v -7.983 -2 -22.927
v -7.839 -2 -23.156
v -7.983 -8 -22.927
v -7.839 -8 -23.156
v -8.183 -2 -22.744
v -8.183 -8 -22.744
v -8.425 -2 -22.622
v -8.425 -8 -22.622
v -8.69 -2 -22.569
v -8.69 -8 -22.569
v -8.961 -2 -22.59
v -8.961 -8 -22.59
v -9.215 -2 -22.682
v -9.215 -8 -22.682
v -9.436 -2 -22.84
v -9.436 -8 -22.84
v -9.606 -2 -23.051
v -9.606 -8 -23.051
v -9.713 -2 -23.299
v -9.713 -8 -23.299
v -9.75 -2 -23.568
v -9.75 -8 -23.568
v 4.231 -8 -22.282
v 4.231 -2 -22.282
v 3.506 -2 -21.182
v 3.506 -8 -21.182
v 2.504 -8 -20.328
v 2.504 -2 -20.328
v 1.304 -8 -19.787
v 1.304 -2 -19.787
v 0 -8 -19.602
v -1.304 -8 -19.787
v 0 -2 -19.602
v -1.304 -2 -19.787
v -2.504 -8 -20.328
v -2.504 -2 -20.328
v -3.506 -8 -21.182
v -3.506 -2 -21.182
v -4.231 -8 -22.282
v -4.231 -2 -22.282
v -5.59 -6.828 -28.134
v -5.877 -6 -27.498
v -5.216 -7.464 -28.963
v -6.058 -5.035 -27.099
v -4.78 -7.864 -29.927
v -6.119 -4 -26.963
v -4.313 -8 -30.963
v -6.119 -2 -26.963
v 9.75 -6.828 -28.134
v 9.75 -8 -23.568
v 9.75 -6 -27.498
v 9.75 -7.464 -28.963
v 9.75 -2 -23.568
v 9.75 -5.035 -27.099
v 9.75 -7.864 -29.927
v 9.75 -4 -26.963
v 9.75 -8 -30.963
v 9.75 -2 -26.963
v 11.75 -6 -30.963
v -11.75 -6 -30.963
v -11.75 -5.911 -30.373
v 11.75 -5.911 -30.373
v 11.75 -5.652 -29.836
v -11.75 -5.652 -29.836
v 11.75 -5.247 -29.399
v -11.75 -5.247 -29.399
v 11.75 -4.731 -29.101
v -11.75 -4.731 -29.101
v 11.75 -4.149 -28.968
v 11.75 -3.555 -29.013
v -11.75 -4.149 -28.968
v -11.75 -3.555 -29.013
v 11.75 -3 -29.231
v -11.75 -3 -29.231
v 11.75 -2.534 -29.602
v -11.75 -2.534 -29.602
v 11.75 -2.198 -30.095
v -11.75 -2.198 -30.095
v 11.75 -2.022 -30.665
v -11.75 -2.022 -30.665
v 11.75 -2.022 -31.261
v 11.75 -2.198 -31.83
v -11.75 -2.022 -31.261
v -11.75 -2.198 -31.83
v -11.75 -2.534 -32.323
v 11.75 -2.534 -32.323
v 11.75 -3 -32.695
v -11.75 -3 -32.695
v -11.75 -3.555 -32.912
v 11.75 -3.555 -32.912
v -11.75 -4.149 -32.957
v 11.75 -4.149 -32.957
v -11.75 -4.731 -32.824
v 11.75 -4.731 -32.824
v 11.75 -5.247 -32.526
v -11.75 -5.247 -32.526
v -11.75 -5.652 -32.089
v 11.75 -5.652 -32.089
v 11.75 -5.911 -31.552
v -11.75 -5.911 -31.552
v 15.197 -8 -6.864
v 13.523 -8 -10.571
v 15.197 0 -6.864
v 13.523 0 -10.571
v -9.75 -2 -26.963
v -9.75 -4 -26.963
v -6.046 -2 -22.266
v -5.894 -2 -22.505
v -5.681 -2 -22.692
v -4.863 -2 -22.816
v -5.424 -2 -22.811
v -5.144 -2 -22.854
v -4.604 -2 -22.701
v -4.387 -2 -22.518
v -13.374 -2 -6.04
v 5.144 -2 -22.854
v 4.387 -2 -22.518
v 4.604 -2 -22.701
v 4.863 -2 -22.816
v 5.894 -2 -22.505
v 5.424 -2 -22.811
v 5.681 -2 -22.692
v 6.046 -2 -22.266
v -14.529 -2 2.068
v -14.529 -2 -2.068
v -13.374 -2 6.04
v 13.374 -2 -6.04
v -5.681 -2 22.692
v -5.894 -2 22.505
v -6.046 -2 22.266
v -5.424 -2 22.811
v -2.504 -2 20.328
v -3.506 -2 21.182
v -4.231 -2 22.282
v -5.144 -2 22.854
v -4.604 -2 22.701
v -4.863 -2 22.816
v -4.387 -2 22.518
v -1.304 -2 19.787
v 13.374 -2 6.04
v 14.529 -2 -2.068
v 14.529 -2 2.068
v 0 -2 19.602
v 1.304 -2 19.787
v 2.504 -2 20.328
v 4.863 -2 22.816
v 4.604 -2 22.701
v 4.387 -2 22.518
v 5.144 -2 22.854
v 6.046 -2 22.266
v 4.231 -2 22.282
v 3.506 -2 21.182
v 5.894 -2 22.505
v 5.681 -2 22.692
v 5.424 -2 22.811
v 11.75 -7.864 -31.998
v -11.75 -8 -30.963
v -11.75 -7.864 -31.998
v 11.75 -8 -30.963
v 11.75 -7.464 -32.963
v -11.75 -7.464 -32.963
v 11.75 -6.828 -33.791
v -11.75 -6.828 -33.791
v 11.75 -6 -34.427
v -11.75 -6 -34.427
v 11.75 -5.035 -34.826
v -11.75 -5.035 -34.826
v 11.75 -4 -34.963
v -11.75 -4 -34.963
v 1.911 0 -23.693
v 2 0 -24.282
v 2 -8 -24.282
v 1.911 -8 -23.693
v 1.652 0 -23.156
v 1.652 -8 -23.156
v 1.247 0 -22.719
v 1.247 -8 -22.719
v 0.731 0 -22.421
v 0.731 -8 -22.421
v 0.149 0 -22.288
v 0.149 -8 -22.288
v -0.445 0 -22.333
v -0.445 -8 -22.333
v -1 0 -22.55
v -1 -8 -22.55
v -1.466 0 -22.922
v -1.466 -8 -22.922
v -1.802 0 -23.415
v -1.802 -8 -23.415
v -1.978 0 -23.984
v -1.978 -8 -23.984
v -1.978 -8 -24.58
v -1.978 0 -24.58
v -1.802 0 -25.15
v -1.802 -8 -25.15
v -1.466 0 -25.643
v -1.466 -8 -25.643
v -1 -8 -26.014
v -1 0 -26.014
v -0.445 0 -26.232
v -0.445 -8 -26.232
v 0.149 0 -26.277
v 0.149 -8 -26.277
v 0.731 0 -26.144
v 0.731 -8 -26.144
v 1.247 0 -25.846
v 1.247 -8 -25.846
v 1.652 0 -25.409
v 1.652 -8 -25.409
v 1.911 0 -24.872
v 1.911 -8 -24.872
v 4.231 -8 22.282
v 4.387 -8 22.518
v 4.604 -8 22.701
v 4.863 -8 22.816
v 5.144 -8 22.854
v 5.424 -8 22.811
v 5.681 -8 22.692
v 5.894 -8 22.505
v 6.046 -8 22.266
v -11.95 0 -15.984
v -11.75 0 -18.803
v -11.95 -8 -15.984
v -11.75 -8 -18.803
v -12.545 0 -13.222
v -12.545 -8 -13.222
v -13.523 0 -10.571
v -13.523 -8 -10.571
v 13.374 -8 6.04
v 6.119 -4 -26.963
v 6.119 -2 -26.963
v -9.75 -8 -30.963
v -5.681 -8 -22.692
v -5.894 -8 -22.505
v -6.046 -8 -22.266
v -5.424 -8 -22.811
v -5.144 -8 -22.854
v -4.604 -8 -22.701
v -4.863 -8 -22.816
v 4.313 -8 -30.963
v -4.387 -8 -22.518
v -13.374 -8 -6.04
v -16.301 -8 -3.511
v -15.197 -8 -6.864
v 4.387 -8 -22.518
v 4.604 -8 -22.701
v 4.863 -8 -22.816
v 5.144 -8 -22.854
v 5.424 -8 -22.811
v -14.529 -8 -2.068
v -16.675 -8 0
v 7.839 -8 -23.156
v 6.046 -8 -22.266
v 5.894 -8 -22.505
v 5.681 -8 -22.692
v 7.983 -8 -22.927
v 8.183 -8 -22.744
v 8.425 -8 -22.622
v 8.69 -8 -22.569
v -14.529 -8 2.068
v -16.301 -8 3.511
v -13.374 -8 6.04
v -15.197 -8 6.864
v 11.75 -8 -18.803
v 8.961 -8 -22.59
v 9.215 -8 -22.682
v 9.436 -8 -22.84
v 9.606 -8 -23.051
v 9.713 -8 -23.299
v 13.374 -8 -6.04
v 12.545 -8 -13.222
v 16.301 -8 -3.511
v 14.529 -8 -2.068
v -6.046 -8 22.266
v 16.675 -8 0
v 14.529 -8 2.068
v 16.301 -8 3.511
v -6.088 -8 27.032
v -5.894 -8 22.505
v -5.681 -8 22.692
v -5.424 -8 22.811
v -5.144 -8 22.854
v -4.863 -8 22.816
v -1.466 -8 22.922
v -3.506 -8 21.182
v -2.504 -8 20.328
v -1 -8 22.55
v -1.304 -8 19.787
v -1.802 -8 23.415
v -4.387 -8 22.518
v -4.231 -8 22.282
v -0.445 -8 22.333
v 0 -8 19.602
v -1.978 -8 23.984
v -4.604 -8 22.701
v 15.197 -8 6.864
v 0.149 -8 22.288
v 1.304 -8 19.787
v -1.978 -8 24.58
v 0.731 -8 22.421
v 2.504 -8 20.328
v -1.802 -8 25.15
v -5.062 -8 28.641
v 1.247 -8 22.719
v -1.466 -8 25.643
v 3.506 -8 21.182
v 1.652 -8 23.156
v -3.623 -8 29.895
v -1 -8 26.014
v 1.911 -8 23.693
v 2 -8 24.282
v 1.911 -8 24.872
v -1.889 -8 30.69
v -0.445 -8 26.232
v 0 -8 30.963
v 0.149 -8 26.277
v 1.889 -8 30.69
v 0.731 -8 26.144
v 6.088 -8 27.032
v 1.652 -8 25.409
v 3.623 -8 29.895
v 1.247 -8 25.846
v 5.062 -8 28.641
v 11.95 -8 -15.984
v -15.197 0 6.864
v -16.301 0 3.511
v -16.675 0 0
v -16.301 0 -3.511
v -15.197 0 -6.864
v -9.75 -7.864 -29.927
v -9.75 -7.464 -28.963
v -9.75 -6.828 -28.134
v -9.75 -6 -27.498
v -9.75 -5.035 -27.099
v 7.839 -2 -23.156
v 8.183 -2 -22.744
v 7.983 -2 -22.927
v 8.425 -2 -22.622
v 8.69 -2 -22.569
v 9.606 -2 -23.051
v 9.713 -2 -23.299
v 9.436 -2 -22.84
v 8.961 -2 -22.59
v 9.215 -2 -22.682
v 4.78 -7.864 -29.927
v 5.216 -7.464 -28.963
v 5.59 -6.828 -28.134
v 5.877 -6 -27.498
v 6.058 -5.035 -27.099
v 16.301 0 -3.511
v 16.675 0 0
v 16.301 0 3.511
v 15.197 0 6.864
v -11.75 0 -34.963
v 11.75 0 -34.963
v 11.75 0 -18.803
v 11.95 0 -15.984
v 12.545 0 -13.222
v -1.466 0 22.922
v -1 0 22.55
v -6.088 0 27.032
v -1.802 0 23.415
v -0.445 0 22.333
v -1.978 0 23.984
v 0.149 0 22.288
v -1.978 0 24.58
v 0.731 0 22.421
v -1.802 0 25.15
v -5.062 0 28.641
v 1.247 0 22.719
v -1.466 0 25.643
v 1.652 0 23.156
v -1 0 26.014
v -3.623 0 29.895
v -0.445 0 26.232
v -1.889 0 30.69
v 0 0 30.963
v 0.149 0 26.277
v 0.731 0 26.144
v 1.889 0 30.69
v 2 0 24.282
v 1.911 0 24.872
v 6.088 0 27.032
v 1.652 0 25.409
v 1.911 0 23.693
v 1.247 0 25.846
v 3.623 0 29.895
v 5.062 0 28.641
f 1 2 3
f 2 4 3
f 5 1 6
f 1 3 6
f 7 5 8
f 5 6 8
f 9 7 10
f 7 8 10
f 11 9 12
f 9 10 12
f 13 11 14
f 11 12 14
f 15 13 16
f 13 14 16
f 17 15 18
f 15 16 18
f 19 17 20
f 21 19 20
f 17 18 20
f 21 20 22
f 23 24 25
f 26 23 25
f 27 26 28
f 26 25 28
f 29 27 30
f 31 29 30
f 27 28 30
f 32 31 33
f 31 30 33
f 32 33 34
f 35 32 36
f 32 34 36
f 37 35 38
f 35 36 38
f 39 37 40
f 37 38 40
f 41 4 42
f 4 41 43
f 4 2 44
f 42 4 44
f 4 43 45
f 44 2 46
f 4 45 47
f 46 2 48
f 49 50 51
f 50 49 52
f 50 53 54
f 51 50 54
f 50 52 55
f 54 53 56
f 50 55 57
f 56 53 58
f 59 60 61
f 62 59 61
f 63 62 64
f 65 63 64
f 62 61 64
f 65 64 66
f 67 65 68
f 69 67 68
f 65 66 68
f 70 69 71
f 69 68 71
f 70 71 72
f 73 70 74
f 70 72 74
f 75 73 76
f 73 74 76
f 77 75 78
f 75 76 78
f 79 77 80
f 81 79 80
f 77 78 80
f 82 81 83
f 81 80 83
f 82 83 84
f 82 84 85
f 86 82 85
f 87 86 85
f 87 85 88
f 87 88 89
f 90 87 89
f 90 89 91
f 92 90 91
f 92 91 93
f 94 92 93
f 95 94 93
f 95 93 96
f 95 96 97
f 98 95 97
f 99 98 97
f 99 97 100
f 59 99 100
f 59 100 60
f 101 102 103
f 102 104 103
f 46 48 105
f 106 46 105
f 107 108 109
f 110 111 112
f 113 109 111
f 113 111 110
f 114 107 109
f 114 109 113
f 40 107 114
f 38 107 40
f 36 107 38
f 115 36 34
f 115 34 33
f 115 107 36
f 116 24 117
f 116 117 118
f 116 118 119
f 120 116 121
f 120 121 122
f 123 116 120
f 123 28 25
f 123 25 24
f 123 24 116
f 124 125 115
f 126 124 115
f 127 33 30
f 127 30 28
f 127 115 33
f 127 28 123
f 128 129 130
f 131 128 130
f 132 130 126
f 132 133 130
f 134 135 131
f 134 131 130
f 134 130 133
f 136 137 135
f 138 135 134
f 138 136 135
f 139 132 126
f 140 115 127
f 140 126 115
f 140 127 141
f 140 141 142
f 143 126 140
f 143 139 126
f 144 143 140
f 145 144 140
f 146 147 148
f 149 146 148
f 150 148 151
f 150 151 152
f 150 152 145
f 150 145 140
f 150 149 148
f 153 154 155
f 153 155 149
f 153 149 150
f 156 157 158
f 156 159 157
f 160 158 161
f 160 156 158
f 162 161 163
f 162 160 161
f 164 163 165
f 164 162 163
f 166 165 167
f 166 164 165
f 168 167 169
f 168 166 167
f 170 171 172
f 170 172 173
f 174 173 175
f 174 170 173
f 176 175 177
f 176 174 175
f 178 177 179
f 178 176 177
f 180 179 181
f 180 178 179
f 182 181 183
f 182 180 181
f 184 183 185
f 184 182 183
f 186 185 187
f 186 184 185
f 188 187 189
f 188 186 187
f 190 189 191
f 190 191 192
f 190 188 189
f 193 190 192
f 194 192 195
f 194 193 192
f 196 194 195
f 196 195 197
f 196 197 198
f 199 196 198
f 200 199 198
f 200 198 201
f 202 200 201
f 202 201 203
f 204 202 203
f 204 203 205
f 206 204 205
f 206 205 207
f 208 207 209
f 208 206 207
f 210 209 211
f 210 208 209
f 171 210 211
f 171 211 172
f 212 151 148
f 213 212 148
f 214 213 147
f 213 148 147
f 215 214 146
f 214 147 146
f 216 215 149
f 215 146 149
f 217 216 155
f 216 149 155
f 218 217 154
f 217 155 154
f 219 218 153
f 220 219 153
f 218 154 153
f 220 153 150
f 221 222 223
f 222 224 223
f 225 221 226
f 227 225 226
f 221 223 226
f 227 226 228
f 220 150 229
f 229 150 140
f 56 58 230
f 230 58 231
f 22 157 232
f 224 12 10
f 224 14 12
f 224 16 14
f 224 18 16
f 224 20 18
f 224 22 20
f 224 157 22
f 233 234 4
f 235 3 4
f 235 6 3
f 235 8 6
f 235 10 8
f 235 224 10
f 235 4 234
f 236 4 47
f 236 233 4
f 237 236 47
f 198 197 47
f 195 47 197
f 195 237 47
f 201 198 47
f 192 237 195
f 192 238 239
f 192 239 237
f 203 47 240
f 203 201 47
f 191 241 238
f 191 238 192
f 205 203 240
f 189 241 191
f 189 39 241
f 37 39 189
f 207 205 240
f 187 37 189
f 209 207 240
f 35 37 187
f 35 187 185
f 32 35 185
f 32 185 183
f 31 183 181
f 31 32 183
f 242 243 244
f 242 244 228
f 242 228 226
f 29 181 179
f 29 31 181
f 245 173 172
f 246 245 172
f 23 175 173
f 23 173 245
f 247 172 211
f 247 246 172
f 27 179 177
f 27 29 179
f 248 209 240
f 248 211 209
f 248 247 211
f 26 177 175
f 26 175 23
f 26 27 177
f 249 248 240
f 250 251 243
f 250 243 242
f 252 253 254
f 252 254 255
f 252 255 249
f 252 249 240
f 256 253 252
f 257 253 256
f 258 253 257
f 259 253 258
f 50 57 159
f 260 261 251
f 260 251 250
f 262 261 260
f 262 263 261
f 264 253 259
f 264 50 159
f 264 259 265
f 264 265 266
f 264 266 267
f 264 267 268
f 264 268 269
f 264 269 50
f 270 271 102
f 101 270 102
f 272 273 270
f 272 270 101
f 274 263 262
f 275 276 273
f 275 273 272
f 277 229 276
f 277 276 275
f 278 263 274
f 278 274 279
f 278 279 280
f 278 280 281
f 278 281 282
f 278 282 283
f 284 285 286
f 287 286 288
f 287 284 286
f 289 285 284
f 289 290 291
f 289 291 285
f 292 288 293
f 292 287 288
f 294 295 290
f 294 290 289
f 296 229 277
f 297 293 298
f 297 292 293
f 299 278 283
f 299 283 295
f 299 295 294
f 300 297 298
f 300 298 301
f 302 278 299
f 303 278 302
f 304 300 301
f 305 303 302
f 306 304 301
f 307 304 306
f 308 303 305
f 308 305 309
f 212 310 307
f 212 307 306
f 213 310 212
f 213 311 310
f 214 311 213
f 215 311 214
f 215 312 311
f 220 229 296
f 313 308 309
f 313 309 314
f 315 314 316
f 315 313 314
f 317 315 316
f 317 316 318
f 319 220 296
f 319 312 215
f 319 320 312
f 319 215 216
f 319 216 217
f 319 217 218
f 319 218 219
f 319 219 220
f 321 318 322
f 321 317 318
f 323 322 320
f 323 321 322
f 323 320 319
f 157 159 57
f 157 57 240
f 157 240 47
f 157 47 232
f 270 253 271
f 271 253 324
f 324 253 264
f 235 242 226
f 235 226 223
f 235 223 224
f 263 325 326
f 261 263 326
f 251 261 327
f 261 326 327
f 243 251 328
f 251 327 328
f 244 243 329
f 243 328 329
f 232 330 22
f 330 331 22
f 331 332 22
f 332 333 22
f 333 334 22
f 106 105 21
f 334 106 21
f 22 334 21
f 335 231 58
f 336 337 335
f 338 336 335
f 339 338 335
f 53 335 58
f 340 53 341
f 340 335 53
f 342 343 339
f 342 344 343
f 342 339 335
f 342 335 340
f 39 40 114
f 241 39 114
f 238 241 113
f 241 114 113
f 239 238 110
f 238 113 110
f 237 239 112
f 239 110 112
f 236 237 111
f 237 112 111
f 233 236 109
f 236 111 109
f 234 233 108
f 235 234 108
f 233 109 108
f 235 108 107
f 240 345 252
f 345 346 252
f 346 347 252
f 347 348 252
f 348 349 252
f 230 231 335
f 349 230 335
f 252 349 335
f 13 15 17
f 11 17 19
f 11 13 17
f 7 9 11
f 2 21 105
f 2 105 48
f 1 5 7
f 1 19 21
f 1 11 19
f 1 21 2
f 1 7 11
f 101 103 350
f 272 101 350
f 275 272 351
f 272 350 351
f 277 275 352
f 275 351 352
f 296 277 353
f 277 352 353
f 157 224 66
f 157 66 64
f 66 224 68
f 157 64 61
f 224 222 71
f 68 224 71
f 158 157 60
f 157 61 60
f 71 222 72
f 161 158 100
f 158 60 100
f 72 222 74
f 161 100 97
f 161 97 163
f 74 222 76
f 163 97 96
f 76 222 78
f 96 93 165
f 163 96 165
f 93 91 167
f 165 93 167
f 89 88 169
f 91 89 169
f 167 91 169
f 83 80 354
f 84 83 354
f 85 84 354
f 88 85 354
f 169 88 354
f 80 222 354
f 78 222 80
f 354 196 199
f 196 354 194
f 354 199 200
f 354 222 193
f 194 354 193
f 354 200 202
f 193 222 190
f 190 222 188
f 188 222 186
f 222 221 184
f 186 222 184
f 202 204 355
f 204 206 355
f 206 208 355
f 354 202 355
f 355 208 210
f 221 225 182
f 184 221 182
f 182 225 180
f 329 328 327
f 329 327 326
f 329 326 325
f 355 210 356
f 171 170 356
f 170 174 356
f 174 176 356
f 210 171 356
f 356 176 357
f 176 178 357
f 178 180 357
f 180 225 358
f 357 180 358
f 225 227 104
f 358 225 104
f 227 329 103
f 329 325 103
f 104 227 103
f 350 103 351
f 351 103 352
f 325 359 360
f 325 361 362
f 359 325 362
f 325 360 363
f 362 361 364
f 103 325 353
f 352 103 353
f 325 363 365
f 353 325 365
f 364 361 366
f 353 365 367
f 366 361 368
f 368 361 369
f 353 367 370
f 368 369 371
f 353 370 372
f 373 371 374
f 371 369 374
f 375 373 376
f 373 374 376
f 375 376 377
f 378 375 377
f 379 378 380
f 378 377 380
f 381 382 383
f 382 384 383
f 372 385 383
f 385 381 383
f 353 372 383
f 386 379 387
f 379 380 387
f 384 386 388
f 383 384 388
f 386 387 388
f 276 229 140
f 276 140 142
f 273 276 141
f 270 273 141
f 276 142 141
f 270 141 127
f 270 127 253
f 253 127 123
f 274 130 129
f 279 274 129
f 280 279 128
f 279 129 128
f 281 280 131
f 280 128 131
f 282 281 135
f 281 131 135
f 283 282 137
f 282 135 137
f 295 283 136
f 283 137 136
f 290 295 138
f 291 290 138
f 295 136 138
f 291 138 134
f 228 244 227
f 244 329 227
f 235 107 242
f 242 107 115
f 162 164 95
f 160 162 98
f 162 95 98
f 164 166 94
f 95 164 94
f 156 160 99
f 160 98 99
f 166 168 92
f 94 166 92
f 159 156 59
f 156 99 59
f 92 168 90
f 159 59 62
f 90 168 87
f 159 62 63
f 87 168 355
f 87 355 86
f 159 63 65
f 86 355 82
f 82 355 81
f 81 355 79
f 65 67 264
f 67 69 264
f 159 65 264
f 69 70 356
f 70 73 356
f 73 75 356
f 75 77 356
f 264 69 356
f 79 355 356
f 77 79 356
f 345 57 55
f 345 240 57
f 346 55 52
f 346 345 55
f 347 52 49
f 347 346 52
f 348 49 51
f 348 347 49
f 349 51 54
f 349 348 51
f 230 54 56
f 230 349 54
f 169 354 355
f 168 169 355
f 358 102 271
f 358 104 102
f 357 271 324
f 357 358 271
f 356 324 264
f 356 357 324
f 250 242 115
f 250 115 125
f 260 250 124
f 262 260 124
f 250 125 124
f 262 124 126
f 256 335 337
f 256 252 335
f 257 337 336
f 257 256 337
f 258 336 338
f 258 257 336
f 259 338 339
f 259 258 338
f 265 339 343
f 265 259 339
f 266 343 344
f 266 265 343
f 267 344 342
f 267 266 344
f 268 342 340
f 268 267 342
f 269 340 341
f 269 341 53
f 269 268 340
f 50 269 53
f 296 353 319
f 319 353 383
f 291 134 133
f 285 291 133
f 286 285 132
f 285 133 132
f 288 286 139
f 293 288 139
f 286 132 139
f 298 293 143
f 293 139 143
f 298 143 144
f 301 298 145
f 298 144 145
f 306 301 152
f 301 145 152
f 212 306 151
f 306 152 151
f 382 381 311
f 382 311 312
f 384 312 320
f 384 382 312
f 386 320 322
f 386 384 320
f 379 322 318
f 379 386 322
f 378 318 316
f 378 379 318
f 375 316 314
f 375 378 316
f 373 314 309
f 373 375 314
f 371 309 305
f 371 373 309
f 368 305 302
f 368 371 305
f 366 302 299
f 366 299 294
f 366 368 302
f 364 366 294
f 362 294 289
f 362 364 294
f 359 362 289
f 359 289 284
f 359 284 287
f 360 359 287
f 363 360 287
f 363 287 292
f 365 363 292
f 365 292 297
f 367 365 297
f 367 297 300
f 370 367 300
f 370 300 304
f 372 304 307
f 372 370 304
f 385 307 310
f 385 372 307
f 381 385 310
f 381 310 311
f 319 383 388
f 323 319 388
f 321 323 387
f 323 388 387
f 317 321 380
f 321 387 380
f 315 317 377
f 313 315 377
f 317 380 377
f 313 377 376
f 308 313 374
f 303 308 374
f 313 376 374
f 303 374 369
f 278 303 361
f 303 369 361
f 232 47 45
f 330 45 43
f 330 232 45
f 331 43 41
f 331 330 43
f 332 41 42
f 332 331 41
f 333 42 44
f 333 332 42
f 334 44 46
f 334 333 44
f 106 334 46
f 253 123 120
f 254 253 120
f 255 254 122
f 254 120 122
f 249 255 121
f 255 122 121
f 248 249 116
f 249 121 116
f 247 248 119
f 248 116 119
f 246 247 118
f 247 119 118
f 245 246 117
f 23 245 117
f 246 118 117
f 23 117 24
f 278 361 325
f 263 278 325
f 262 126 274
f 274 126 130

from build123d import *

# Parameters (mm, degrees)
F0_R     = 2
F1_DEPTH = 8
F2_DEPTH = 2
F3_R     = 20
F4_R     = 1
F6_D     = 4
F7_R     = 3.99999


# Not quite as in the source:
# - a fillet or chamfer is up to 0.001 mm smaller than in the source, because OpenCascade refuses the exact size
# - a feature names something its author has since deleted; it is built from what else it names


with BuildPart() as f1:
    # F0 (on Front) → F1 (new body)
    with BuildSketch(Plane.XZ):
        with BuildLine():
            Line((15.1970139668, 6.8636525628), (6.0880650012, 27.0320429916))
            ThreePointArc((6.0880650012, 27.0320429916), (0, 30.9626), (-6.0880650012, 27.0320429916))
            Line((-6.0880650012, 27.0320429916), (-15.1970139668, 6.8636525628))
            ThreePointArc((-15.1970139668, 6.8636525628), (-16.6751, 0), (-15.1970139668, -6.8636525628))
            Line((-15.1970139668, -6.8636525628), (-11.75, -14.4957870449))
            Line((-11.75, -14.4957870449), (-9.75, -18.9240455641))
            Line((-9.75, -18.9240455641), (-6.1194285683, -26.9626))
            Line((-6.1194285683, -26.9626), (6.1194285683, -26.9626))
            Line((6.1194285683, -26.9626), (9.75, -18.9240455641))
            Line((9.75, -18.9240455641), (11.75, -14.4957870449))
            Line((11.75, -14.4957870449), (15.1970139668, -6.8636525628))
            ThreePointArc((15.1970139668, -6.8636525628), (16.6751, 0), (15.1970139668, 6.8636525628))
        make_face()
        with Locations((0, -24.2824)):
            Circle(F0_R, mode=Mode.SUBTRACT)
        with BuildLine():
            Line((-13.3742945868, 6.0404308054), (-6.0462846285, 22.2655920687))
            ThreePointArc((-6.0462846285, 22.2655920687), (-5.1436901116, 22.8539427752), (-4.2309206889, 22.2815046593))
            ThreePointArc((-4.2309206889, 22.2815046593), (0, 19.6022), (4.2309206889, 22.2815046593))
            ThreePointArc((4.2309206889, 22.2815046593), (5.1436901116, 22.8539427752), (6.0462846285, 22.2655920687))
            Line((6.0462846285, 22.2655920687), (13.3742945868, 6.0404308054))
            ThreePointArc((13.3742945868, 6.0404308054), (14.6751, 0), (13.3742945868, -6.0404308054))
            Line((13.3742945868, -6.0404308054), (6.0462846285, -22.2655920687))
            ThreePointArc((6.0462846285, -22.2655920687), (5.1436901116, -22.8539427752), (4.2309206889, -22.2815046593))
            ThreePointArc((4.2309206889, -22.2815046593), (0, -19.6022), (-4.2309206889, -22.2815046593))
            ThreePointArc((-4.2309206889, -22.2815046593), (-5.1436901116, -22.8539427752), (-6.0462846285, -22.2655920687))
            Line((-6.0462846285, -22.2655920687), (-13.3742945868, -6.0404308054))
            ThreePointArc((-13.3742945868, -6.0404308054), (-14.6751, 0), (-13.3742945868, 6.0404308054))
        make_face(mode=Mode.SUBTRACT)
        with Locations((0, 24.2824)):
            Circle(F0_R, mode=Mode.SUBTRACT)
        Polygon((11.75, -34.9626), (11.75, -14.4957870449), (9.75, -18.9240455641), (9.75, -26.9626), (6.1194285683, -26.9626), (-6.1194285683, -26.9626), (-9.75, -26.9626), (-9.75, -18.9240455641), (-11.75, -14.4957870449), (-11.75, -34.9626), align=None)
    extrude(amount=F1_DEPTH)

    # F0 (on Front) → F2 (join)
    with BuildSketch(Plane.XZ):
        with BuildLine():
            ThreePointArc((-4.2309206889, 22.2815046593), (-5.1436901116, 22.8539427752), (-6.0462846285, 22.2655920687))
            Line((-6.0462846285, 22.2655920687), (-13.3742945868, 6.0404308054))
            ThreePointArc((-13.3742945868, 6.0404308054), (-14.6751, 0), (-13.3742945868, -6.0404308054))
            Line((-13.3742945868, -6.0404308054), (-6.0462846285, -22.2655920687))
            ThreePointArc((-6.0462846285, -22.2655920687), (-5.1436901116, -22.8539427752), (-4.2309206889, -22.2815046593))
            ThreePointArc((-4.2309206889, -22.2815046593), (0, -19.6022), (4.2309206889, -22.2815046593))
            ThreePointArc((4.2309206889, -22.2815046593), (5.1436901116, -22.8539427752), (6.0462846285, -22.2655920687))
            Line((6.0462846285, -22.2655920687), (13.3742945868, -6.0404308054))
            ThreePointArc((13.3742945868, -6.0404308054), (14.6751, 0), (13.3742945868, 6.0404308054))
            Line((13.3742945868, 6.0404308054), (6.0462846285, 22.2655920687))
            ThreePointArc((6.0462846285, 22.2655920687), (5.1436901116, 22.8539427752), (4.2309206889, 22.2815046593))
            ThreePointArc((4.2309206889, 22.2815046593), (0, 19.6022), (-4.2309206889, 22.2815046593))
        make_face()
        Polygon((11.75, -34.9626), (11.75, -14.4957870449), (9.75, -18.9240455641), (9.75, -26.9626), (6.1194285683, -26.9626), (-6.1194285683, -26.9626), (-9.75, -26.9626), (-9.75, -18.9240455641), (-11.75, -14.4957870449), (-11.75, -34.9626), align=None)
        Polygon((-6.1194285683, -26.9626), (-9.75, -18.9240455641), (-9.75, -26.9626), align=None)
        Polygon((9.75, -26.9626), (9.75, -18.9240455641), (6.1194285683, -26.9626), align=None)
    extrude(amount=F2_DEPTH)

    # F3
    f3_edges = [f1.edges().sort_by_distance(p)[0] for p in [
        (11.75, -4, -14.495787),
        (-11.75, -4, -14.495787),
    ]]
    fillet(f3_edges, radius=F3_R)

    # F4
    f4_edges = [f1.edges().sort_by_distance(p)[0] for p in [
        (9.75, -5, -18.924046),
        (-9.75, -5, -18.924046),
    ]]
    fillet(f4_edges, radius=F4_R)

    # F6 (through all)
    with Locations(Plane.YZ.offset(11.75)):
        with Locations((-4, -30.9626)):
            Hole(F6_D / 2)

    # F7 (radius 4 in the source; OpenCascade refuses exactly that, so slightly less here)
    f7_edges = [f1.edges().sort_by_distance(p)[0] for p in [
        (0, -8, -34.9626),
        (7.934714, -8, -26.9626),
        (-7.934714, -8, -26.9626),
    ]]
    fillet(f7_edges, radius=F7_R)


solid = f1.part
